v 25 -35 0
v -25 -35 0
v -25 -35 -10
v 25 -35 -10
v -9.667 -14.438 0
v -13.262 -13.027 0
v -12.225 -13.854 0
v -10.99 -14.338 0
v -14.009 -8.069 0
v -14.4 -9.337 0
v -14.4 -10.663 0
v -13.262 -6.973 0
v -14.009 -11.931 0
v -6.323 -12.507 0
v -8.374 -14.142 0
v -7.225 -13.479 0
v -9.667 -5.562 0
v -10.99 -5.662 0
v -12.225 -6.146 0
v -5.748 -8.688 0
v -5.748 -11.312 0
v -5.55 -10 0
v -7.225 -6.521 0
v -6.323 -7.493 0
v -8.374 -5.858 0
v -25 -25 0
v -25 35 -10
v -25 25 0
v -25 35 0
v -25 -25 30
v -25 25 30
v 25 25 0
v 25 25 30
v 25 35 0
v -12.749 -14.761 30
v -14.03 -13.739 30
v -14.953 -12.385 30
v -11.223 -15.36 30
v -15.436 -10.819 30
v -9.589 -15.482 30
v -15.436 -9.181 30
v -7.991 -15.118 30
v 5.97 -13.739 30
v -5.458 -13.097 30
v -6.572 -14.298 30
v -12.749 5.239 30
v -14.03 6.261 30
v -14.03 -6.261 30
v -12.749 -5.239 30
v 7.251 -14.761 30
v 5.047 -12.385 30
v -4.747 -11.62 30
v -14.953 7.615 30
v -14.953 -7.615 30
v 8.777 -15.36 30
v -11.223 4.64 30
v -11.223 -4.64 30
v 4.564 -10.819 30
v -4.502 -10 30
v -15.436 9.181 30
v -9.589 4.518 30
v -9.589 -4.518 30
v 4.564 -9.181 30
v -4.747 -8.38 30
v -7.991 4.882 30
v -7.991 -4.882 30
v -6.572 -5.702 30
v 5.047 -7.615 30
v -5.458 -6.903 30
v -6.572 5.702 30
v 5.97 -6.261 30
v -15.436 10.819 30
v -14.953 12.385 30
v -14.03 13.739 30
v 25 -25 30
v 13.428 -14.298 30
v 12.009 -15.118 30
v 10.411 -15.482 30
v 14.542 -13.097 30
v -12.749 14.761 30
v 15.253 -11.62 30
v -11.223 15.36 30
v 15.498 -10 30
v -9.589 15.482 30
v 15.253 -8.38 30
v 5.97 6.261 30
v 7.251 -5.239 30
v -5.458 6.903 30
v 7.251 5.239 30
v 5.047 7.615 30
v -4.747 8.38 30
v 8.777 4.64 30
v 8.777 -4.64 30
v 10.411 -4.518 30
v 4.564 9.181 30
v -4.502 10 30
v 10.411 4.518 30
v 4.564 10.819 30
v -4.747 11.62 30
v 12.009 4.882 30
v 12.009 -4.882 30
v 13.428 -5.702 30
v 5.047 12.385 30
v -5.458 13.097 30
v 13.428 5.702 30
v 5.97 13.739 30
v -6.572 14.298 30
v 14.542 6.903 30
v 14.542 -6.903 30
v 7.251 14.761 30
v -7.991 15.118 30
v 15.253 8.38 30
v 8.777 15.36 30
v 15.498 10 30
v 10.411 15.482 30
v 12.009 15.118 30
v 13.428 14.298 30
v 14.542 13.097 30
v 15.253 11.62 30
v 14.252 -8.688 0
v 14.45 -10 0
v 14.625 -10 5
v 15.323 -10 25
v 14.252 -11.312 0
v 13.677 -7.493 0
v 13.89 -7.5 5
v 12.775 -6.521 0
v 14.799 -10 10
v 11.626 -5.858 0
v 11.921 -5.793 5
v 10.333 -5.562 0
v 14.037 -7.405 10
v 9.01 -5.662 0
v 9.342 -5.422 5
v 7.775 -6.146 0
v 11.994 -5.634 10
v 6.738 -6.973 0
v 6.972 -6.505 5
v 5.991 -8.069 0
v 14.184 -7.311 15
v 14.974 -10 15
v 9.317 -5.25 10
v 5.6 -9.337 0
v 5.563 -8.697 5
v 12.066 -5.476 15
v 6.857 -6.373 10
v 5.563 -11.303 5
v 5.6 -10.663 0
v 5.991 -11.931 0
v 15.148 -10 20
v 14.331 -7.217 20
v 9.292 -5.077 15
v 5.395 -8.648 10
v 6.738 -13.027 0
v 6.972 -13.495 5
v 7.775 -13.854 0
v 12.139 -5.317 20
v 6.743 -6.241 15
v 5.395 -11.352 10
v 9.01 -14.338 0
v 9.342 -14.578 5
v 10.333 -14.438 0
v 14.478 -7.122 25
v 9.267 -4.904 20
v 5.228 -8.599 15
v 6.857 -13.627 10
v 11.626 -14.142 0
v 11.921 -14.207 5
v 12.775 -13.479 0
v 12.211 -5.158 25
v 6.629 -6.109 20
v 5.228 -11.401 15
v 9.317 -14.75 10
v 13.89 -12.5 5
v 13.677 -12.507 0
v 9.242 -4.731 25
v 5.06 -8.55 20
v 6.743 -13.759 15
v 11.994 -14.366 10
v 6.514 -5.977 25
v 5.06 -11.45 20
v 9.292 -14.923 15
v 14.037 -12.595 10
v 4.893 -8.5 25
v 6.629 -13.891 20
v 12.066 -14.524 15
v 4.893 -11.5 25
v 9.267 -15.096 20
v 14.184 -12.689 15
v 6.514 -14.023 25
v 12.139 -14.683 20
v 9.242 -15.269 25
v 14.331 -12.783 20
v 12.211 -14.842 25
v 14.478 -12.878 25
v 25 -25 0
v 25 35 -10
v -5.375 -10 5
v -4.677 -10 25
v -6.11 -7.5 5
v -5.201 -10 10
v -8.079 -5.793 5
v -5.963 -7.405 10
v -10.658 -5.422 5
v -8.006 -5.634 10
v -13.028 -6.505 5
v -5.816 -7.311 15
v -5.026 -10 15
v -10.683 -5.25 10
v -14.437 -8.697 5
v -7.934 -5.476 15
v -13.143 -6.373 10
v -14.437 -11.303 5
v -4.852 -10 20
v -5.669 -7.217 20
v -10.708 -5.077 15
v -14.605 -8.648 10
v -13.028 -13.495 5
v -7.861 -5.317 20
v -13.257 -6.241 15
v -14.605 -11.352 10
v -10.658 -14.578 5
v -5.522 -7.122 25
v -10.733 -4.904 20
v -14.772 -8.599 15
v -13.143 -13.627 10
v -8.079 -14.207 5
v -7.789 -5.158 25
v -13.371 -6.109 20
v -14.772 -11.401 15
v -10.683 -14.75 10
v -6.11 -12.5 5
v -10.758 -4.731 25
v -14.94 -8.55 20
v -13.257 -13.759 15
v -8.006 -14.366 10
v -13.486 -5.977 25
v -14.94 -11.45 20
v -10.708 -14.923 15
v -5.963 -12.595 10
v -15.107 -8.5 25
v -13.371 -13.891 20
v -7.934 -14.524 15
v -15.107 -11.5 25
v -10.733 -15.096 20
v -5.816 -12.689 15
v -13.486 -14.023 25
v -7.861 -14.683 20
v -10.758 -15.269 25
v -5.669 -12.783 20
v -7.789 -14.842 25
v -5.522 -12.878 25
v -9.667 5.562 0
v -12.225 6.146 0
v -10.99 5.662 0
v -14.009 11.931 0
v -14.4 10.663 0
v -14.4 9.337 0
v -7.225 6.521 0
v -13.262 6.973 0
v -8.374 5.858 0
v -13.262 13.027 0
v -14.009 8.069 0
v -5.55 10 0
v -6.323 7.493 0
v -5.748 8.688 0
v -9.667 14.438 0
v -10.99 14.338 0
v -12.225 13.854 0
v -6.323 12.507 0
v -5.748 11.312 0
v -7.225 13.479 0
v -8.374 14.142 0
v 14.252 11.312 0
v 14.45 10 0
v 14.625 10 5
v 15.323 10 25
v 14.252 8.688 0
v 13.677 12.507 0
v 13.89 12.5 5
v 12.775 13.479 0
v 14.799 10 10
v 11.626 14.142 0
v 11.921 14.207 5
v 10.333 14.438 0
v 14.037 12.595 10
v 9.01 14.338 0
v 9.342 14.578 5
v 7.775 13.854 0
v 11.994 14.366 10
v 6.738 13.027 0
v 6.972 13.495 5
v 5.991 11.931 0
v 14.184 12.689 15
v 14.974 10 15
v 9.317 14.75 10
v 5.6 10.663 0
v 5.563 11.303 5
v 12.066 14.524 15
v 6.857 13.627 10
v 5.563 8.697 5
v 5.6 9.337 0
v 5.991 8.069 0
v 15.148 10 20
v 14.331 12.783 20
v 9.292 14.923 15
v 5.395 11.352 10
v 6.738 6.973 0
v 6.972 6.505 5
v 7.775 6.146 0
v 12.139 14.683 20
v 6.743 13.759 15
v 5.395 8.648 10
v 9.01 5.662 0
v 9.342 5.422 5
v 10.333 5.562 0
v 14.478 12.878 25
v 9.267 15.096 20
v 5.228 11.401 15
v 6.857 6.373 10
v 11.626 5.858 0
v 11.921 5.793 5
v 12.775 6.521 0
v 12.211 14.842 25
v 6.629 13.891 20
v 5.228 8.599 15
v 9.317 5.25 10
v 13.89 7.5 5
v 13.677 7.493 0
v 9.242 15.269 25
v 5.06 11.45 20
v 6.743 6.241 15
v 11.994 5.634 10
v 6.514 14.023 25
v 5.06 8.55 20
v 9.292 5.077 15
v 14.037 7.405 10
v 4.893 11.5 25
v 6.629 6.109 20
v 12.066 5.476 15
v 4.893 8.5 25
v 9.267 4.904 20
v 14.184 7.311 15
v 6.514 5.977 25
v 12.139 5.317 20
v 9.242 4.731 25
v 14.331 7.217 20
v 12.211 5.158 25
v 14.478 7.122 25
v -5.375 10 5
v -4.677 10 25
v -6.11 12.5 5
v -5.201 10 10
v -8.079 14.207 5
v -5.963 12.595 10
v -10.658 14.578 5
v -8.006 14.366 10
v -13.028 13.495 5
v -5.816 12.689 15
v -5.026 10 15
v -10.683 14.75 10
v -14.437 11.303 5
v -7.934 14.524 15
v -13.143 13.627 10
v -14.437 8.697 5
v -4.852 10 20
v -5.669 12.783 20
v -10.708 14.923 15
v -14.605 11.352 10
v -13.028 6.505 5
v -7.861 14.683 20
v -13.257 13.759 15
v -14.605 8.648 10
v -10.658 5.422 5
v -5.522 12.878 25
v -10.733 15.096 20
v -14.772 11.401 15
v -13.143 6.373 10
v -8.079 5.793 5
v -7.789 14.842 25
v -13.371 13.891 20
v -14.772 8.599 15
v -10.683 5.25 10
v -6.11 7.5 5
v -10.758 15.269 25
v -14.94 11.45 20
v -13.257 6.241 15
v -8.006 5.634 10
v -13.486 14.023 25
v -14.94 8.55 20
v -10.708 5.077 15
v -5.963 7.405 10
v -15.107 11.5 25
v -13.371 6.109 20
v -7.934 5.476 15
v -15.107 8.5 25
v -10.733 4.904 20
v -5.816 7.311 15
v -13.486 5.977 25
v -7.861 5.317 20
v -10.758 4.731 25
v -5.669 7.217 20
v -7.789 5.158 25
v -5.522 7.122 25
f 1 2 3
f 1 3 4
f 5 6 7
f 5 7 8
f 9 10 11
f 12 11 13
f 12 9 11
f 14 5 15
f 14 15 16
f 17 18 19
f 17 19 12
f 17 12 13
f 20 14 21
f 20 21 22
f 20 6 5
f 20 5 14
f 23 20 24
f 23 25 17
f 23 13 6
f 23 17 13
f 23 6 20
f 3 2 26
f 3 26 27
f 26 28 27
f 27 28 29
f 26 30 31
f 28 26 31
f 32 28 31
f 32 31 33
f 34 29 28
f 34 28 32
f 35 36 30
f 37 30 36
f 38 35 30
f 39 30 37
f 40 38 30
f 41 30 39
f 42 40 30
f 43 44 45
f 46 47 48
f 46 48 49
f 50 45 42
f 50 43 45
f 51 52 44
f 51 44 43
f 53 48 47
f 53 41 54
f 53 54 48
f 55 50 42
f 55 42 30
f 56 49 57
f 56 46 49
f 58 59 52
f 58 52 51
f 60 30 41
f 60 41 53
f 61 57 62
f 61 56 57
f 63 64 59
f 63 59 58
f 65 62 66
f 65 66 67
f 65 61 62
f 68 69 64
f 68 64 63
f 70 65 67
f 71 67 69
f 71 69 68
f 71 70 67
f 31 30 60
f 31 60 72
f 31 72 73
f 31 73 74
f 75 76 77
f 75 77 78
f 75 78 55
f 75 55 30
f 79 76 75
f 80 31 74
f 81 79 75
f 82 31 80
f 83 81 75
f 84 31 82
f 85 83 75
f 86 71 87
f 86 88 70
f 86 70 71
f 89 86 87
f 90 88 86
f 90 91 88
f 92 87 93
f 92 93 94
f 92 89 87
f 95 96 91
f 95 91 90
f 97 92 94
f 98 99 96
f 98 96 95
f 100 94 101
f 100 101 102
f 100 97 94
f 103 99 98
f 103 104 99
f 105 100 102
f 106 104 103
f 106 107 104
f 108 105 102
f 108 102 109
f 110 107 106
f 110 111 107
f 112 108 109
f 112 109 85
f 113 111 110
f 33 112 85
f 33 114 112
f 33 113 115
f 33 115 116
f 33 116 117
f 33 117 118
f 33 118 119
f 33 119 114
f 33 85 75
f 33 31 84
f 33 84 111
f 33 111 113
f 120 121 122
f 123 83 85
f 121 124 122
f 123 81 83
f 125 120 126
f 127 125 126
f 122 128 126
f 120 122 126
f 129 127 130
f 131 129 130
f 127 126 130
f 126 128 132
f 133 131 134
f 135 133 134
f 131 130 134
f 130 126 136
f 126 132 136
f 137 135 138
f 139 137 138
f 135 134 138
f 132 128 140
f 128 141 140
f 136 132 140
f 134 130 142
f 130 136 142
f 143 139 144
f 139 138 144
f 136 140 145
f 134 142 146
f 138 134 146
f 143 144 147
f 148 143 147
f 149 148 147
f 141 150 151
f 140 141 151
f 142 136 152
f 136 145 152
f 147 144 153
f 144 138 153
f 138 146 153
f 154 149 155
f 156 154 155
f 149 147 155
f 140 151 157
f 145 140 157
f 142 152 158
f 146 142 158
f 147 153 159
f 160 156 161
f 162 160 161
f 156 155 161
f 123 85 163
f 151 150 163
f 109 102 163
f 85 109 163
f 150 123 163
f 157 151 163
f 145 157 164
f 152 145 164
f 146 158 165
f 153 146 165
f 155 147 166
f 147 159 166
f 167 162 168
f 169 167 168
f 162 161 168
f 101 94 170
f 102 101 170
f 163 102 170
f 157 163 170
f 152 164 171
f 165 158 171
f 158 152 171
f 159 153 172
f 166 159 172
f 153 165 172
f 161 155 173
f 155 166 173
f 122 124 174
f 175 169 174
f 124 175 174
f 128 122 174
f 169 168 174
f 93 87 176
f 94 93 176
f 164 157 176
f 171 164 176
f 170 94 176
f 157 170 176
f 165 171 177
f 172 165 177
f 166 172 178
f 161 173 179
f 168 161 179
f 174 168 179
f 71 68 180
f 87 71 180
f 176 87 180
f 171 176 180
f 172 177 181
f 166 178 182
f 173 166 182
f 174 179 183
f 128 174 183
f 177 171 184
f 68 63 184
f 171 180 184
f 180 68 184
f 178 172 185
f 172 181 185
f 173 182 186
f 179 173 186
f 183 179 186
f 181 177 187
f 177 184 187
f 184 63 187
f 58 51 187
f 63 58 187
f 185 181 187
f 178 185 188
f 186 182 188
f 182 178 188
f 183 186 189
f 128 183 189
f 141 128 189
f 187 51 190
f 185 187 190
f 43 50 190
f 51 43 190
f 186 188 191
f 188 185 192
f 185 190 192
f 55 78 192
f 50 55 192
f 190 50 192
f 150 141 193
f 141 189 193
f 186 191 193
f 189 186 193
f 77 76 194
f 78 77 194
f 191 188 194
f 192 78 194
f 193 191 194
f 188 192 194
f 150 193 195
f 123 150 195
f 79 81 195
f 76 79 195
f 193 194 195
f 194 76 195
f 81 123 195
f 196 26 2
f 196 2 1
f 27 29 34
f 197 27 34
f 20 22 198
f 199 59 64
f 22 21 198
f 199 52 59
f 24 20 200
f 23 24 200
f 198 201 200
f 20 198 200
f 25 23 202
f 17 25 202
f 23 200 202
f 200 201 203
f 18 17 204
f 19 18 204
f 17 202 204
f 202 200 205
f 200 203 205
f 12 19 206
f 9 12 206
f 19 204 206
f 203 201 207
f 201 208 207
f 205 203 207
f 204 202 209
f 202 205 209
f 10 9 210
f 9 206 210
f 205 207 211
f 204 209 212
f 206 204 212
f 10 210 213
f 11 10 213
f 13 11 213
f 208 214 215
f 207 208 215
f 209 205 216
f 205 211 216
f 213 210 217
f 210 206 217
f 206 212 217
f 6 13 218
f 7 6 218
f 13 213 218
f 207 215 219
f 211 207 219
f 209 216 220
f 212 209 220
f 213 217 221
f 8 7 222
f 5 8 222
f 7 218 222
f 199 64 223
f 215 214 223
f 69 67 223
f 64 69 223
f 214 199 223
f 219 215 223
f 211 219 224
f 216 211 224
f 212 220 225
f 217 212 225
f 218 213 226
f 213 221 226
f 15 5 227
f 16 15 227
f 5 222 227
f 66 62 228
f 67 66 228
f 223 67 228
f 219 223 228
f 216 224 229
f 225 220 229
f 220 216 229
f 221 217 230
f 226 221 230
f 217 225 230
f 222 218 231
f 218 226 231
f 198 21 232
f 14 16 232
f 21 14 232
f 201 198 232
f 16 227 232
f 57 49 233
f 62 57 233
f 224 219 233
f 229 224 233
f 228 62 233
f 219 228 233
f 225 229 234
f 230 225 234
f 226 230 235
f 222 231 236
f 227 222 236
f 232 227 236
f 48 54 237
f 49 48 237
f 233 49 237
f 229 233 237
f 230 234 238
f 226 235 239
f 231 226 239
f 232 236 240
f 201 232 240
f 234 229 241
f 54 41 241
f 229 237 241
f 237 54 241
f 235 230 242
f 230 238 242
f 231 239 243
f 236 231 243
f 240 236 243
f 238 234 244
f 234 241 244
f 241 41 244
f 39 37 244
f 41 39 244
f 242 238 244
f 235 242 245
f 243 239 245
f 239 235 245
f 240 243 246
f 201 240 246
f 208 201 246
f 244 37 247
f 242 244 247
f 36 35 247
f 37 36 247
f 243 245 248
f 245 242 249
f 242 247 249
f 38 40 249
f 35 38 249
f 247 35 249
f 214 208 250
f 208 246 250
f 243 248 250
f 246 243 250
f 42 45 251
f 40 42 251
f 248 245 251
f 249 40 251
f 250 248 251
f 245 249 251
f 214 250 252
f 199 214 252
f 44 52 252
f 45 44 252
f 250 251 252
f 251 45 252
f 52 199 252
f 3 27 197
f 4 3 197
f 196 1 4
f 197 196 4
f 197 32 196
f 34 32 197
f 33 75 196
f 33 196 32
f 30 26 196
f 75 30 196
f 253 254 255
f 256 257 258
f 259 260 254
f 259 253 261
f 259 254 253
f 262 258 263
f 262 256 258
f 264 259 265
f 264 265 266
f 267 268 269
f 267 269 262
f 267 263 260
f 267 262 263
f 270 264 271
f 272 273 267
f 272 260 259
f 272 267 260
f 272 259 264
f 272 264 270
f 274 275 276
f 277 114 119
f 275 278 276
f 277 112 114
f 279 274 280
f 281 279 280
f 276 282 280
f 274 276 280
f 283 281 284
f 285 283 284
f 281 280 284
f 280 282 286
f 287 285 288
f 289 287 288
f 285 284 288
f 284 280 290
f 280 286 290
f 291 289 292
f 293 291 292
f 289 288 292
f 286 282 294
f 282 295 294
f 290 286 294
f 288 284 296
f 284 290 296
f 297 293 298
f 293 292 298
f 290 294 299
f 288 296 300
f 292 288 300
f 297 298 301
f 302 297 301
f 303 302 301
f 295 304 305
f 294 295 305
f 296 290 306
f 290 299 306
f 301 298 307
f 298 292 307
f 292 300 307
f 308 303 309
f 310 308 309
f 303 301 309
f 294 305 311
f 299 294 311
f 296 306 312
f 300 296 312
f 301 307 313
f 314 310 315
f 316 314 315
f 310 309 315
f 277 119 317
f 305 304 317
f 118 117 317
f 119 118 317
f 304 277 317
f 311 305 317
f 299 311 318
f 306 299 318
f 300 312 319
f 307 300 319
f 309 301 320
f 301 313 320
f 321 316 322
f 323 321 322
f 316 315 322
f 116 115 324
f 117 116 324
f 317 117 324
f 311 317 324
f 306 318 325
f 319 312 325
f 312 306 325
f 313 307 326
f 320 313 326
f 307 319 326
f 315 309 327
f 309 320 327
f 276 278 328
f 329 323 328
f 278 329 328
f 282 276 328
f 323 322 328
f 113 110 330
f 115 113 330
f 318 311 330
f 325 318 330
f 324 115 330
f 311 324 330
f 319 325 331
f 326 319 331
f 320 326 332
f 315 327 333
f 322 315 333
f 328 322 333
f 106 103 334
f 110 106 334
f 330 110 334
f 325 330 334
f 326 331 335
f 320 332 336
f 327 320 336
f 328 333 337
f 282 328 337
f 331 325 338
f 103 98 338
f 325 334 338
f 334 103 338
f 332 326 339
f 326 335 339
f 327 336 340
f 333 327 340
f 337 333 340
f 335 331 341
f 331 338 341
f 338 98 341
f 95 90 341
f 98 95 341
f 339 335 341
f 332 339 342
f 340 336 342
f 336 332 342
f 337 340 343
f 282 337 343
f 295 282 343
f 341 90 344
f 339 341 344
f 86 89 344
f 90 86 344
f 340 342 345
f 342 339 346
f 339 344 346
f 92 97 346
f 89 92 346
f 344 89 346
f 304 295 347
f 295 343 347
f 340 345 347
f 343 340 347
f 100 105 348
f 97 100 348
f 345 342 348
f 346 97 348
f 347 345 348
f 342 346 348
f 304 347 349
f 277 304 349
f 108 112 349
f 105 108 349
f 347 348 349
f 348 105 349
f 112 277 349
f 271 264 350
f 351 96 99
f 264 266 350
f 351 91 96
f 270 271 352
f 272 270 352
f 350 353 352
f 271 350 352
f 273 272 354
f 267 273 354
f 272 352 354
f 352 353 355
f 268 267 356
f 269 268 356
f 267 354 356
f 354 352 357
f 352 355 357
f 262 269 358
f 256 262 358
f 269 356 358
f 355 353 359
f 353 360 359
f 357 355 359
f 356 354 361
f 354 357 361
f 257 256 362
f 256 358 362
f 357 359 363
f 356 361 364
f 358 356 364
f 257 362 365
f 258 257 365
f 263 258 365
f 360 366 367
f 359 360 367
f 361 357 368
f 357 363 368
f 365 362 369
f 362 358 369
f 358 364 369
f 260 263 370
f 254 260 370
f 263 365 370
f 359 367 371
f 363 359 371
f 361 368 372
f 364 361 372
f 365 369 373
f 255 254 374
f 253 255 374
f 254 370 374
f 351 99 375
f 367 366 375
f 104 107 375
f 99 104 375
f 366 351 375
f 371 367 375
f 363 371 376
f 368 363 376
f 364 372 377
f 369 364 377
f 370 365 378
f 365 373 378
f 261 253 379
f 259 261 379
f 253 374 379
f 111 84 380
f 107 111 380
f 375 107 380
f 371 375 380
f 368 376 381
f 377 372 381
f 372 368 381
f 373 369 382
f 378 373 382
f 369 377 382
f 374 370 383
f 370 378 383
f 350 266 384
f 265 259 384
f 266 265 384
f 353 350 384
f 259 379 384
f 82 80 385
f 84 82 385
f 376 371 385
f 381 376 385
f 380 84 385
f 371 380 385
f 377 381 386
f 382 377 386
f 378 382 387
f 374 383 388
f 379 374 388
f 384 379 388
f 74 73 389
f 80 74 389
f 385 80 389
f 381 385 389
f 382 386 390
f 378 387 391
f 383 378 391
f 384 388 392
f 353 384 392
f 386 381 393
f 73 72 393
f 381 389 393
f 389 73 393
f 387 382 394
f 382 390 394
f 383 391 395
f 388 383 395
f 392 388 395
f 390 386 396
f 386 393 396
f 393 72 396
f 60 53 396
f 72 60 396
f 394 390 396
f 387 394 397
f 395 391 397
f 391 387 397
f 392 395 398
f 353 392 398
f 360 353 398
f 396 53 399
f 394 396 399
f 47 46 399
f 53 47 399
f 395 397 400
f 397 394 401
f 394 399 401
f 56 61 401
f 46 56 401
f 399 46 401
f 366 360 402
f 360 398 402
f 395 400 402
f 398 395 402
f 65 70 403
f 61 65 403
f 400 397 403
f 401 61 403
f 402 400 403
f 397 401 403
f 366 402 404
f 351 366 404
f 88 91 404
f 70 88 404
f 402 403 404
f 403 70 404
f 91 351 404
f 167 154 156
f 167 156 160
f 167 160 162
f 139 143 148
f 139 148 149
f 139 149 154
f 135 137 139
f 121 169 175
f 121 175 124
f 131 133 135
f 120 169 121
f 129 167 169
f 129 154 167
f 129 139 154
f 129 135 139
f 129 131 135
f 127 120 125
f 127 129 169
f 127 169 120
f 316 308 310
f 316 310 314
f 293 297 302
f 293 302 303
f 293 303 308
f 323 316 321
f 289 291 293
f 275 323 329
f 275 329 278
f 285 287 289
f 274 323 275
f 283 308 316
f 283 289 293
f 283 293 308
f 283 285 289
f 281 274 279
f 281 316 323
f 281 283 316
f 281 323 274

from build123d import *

# Parameters (mm, degrees)
F0_W     = 50
F0_H     = 50
F1_DEPTH = 30
F2_R     = 4.45
F3_DEPTH = 30
F3_TAPER = -2
F4_W     = 50
F4_H     = 70
F5_DEPTH = 10


with BuildPart() as f1:
    # F0 (on Top) → F1 (new body)
    with BuildSketch(Plane.XY):
        Rectangle(F0_W, F0_H)
    extrude(amount=F1_DEPTH)

    # F2 (on Top) → F3 (cut)
    with BuildSketch(Plane.XY):
        with Locations((10, 10)):
            Circle(F2_R)
        with Locations((-10, 10)):
            Circle(F2_R)
        with Locations((10, -10)):
            Circle(F2_R)
        with Locations((-10, -10)):
            Circle(F2_R)
    extrude(amount=F3_DEPTH, taper=F3_TAPER, mode=Mode.SUBTRACT)

    # F4 (on Top) → F5 (join)
    with BuildSketch(Plane.XY):
        Rectangle(F4_W, F4_H)
    extrude(amount=-F5_DEPTH)


solid = f1.part
